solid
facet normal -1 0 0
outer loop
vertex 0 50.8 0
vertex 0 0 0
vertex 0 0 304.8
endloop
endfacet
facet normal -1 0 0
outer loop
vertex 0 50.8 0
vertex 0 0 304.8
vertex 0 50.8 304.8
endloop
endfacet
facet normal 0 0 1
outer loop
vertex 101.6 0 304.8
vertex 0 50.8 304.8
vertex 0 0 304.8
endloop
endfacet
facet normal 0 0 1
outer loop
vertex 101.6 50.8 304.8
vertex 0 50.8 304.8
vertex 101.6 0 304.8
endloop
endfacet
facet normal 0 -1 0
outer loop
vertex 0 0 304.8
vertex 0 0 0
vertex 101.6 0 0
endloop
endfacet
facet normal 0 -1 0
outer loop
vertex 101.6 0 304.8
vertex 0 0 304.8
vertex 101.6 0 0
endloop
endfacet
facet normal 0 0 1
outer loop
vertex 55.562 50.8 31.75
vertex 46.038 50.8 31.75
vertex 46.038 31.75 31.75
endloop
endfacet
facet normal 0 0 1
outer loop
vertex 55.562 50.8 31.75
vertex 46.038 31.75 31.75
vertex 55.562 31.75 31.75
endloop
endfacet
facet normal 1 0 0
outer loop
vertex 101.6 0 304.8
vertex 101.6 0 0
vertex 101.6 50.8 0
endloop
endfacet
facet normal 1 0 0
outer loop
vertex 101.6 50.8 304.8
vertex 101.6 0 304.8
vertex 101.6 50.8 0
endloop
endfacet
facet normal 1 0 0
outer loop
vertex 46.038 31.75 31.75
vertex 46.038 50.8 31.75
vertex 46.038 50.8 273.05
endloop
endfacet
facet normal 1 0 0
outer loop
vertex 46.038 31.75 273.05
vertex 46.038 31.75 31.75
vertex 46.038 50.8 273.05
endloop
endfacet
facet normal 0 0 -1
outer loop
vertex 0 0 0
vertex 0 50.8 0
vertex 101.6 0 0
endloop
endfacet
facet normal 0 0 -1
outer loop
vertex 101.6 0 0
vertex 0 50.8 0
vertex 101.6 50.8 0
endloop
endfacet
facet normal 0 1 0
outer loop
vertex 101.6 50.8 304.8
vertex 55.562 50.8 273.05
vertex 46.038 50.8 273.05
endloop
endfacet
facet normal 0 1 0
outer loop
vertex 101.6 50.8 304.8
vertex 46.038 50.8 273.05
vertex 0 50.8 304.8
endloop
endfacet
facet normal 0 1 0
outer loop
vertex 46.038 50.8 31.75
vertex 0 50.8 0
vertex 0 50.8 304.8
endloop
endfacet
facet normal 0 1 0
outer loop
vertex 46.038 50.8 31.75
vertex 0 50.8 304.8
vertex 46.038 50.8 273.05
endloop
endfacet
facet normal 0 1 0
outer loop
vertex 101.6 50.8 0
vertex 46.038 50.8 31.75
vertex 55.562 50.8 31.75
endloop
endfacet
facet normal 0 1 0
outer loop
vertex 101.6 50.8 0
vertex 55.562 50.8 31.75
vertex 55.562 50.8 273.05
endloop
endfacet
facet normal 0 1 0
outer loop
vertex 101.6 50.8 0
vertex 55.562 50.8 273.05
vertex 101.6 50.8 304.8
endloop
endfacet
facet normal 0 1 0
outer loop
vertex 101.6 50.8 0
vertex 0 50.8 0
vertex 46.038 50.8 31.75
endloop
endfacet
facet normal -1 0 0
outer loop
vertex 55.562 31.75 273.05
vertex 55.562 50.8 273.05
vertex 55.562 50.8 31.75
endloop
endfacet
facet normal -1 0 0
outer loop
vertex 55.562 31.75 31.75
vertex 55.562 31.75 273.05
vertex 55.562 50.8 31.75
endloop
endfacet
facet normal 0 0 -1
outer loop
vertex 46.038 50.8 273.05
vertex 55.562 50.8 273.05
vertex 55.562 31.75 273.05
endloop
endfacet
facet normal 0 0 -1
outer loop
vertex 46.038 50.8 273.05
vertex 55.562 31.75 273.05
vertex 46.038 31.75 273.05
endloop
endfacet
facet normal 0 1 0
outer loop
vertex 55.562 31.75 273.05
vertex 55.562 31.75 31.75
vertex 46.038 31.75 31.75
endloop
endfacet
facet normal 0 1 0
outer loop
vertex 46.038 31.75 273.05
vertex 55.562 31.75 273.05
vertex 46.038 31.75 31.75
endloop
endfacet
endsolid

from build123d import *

# Parameters (mm, degrees)
SKETCH1_W           = 101.6
SKETCH1_H           = 50.8
BOSS_EXTRUDE1_DEPTH = 304.8
CUT_EXTRUDE1_DEPTH  = 19.05


with BuildPart() as part:
    # Sketch1 → Boss-Extrude1 (new body)
    with BuildSketch(Plane.XY):
        with Locations((50.8, 25.4)):
            Rectangle(SKETCH1_W, SKETCH1_H)
    extrude(amount=BOSS_EXTRUDE1_DEPTH)

    # Sketch2 → Cut-Extrude1 (cut)
    with BuildSketch(Plane(origin=(0, 50.8, 0), x_dir=(1, 0, 0), z_dir=(0, 1, 0))):
        Polygon((46.0375, -41.275), (46.0375, -31.75), (55.5625, -31.75), (55.5625, -41.275), (55.5625, -263.525), (55.5625, -273.05), (46.0375, -273.05), (46.0375, -263.525), align=None)
    extrude(amount=-CUT_EXTRUDE1_DEPTH, mode=Mode.SUBTRACT)


solid = part.part
